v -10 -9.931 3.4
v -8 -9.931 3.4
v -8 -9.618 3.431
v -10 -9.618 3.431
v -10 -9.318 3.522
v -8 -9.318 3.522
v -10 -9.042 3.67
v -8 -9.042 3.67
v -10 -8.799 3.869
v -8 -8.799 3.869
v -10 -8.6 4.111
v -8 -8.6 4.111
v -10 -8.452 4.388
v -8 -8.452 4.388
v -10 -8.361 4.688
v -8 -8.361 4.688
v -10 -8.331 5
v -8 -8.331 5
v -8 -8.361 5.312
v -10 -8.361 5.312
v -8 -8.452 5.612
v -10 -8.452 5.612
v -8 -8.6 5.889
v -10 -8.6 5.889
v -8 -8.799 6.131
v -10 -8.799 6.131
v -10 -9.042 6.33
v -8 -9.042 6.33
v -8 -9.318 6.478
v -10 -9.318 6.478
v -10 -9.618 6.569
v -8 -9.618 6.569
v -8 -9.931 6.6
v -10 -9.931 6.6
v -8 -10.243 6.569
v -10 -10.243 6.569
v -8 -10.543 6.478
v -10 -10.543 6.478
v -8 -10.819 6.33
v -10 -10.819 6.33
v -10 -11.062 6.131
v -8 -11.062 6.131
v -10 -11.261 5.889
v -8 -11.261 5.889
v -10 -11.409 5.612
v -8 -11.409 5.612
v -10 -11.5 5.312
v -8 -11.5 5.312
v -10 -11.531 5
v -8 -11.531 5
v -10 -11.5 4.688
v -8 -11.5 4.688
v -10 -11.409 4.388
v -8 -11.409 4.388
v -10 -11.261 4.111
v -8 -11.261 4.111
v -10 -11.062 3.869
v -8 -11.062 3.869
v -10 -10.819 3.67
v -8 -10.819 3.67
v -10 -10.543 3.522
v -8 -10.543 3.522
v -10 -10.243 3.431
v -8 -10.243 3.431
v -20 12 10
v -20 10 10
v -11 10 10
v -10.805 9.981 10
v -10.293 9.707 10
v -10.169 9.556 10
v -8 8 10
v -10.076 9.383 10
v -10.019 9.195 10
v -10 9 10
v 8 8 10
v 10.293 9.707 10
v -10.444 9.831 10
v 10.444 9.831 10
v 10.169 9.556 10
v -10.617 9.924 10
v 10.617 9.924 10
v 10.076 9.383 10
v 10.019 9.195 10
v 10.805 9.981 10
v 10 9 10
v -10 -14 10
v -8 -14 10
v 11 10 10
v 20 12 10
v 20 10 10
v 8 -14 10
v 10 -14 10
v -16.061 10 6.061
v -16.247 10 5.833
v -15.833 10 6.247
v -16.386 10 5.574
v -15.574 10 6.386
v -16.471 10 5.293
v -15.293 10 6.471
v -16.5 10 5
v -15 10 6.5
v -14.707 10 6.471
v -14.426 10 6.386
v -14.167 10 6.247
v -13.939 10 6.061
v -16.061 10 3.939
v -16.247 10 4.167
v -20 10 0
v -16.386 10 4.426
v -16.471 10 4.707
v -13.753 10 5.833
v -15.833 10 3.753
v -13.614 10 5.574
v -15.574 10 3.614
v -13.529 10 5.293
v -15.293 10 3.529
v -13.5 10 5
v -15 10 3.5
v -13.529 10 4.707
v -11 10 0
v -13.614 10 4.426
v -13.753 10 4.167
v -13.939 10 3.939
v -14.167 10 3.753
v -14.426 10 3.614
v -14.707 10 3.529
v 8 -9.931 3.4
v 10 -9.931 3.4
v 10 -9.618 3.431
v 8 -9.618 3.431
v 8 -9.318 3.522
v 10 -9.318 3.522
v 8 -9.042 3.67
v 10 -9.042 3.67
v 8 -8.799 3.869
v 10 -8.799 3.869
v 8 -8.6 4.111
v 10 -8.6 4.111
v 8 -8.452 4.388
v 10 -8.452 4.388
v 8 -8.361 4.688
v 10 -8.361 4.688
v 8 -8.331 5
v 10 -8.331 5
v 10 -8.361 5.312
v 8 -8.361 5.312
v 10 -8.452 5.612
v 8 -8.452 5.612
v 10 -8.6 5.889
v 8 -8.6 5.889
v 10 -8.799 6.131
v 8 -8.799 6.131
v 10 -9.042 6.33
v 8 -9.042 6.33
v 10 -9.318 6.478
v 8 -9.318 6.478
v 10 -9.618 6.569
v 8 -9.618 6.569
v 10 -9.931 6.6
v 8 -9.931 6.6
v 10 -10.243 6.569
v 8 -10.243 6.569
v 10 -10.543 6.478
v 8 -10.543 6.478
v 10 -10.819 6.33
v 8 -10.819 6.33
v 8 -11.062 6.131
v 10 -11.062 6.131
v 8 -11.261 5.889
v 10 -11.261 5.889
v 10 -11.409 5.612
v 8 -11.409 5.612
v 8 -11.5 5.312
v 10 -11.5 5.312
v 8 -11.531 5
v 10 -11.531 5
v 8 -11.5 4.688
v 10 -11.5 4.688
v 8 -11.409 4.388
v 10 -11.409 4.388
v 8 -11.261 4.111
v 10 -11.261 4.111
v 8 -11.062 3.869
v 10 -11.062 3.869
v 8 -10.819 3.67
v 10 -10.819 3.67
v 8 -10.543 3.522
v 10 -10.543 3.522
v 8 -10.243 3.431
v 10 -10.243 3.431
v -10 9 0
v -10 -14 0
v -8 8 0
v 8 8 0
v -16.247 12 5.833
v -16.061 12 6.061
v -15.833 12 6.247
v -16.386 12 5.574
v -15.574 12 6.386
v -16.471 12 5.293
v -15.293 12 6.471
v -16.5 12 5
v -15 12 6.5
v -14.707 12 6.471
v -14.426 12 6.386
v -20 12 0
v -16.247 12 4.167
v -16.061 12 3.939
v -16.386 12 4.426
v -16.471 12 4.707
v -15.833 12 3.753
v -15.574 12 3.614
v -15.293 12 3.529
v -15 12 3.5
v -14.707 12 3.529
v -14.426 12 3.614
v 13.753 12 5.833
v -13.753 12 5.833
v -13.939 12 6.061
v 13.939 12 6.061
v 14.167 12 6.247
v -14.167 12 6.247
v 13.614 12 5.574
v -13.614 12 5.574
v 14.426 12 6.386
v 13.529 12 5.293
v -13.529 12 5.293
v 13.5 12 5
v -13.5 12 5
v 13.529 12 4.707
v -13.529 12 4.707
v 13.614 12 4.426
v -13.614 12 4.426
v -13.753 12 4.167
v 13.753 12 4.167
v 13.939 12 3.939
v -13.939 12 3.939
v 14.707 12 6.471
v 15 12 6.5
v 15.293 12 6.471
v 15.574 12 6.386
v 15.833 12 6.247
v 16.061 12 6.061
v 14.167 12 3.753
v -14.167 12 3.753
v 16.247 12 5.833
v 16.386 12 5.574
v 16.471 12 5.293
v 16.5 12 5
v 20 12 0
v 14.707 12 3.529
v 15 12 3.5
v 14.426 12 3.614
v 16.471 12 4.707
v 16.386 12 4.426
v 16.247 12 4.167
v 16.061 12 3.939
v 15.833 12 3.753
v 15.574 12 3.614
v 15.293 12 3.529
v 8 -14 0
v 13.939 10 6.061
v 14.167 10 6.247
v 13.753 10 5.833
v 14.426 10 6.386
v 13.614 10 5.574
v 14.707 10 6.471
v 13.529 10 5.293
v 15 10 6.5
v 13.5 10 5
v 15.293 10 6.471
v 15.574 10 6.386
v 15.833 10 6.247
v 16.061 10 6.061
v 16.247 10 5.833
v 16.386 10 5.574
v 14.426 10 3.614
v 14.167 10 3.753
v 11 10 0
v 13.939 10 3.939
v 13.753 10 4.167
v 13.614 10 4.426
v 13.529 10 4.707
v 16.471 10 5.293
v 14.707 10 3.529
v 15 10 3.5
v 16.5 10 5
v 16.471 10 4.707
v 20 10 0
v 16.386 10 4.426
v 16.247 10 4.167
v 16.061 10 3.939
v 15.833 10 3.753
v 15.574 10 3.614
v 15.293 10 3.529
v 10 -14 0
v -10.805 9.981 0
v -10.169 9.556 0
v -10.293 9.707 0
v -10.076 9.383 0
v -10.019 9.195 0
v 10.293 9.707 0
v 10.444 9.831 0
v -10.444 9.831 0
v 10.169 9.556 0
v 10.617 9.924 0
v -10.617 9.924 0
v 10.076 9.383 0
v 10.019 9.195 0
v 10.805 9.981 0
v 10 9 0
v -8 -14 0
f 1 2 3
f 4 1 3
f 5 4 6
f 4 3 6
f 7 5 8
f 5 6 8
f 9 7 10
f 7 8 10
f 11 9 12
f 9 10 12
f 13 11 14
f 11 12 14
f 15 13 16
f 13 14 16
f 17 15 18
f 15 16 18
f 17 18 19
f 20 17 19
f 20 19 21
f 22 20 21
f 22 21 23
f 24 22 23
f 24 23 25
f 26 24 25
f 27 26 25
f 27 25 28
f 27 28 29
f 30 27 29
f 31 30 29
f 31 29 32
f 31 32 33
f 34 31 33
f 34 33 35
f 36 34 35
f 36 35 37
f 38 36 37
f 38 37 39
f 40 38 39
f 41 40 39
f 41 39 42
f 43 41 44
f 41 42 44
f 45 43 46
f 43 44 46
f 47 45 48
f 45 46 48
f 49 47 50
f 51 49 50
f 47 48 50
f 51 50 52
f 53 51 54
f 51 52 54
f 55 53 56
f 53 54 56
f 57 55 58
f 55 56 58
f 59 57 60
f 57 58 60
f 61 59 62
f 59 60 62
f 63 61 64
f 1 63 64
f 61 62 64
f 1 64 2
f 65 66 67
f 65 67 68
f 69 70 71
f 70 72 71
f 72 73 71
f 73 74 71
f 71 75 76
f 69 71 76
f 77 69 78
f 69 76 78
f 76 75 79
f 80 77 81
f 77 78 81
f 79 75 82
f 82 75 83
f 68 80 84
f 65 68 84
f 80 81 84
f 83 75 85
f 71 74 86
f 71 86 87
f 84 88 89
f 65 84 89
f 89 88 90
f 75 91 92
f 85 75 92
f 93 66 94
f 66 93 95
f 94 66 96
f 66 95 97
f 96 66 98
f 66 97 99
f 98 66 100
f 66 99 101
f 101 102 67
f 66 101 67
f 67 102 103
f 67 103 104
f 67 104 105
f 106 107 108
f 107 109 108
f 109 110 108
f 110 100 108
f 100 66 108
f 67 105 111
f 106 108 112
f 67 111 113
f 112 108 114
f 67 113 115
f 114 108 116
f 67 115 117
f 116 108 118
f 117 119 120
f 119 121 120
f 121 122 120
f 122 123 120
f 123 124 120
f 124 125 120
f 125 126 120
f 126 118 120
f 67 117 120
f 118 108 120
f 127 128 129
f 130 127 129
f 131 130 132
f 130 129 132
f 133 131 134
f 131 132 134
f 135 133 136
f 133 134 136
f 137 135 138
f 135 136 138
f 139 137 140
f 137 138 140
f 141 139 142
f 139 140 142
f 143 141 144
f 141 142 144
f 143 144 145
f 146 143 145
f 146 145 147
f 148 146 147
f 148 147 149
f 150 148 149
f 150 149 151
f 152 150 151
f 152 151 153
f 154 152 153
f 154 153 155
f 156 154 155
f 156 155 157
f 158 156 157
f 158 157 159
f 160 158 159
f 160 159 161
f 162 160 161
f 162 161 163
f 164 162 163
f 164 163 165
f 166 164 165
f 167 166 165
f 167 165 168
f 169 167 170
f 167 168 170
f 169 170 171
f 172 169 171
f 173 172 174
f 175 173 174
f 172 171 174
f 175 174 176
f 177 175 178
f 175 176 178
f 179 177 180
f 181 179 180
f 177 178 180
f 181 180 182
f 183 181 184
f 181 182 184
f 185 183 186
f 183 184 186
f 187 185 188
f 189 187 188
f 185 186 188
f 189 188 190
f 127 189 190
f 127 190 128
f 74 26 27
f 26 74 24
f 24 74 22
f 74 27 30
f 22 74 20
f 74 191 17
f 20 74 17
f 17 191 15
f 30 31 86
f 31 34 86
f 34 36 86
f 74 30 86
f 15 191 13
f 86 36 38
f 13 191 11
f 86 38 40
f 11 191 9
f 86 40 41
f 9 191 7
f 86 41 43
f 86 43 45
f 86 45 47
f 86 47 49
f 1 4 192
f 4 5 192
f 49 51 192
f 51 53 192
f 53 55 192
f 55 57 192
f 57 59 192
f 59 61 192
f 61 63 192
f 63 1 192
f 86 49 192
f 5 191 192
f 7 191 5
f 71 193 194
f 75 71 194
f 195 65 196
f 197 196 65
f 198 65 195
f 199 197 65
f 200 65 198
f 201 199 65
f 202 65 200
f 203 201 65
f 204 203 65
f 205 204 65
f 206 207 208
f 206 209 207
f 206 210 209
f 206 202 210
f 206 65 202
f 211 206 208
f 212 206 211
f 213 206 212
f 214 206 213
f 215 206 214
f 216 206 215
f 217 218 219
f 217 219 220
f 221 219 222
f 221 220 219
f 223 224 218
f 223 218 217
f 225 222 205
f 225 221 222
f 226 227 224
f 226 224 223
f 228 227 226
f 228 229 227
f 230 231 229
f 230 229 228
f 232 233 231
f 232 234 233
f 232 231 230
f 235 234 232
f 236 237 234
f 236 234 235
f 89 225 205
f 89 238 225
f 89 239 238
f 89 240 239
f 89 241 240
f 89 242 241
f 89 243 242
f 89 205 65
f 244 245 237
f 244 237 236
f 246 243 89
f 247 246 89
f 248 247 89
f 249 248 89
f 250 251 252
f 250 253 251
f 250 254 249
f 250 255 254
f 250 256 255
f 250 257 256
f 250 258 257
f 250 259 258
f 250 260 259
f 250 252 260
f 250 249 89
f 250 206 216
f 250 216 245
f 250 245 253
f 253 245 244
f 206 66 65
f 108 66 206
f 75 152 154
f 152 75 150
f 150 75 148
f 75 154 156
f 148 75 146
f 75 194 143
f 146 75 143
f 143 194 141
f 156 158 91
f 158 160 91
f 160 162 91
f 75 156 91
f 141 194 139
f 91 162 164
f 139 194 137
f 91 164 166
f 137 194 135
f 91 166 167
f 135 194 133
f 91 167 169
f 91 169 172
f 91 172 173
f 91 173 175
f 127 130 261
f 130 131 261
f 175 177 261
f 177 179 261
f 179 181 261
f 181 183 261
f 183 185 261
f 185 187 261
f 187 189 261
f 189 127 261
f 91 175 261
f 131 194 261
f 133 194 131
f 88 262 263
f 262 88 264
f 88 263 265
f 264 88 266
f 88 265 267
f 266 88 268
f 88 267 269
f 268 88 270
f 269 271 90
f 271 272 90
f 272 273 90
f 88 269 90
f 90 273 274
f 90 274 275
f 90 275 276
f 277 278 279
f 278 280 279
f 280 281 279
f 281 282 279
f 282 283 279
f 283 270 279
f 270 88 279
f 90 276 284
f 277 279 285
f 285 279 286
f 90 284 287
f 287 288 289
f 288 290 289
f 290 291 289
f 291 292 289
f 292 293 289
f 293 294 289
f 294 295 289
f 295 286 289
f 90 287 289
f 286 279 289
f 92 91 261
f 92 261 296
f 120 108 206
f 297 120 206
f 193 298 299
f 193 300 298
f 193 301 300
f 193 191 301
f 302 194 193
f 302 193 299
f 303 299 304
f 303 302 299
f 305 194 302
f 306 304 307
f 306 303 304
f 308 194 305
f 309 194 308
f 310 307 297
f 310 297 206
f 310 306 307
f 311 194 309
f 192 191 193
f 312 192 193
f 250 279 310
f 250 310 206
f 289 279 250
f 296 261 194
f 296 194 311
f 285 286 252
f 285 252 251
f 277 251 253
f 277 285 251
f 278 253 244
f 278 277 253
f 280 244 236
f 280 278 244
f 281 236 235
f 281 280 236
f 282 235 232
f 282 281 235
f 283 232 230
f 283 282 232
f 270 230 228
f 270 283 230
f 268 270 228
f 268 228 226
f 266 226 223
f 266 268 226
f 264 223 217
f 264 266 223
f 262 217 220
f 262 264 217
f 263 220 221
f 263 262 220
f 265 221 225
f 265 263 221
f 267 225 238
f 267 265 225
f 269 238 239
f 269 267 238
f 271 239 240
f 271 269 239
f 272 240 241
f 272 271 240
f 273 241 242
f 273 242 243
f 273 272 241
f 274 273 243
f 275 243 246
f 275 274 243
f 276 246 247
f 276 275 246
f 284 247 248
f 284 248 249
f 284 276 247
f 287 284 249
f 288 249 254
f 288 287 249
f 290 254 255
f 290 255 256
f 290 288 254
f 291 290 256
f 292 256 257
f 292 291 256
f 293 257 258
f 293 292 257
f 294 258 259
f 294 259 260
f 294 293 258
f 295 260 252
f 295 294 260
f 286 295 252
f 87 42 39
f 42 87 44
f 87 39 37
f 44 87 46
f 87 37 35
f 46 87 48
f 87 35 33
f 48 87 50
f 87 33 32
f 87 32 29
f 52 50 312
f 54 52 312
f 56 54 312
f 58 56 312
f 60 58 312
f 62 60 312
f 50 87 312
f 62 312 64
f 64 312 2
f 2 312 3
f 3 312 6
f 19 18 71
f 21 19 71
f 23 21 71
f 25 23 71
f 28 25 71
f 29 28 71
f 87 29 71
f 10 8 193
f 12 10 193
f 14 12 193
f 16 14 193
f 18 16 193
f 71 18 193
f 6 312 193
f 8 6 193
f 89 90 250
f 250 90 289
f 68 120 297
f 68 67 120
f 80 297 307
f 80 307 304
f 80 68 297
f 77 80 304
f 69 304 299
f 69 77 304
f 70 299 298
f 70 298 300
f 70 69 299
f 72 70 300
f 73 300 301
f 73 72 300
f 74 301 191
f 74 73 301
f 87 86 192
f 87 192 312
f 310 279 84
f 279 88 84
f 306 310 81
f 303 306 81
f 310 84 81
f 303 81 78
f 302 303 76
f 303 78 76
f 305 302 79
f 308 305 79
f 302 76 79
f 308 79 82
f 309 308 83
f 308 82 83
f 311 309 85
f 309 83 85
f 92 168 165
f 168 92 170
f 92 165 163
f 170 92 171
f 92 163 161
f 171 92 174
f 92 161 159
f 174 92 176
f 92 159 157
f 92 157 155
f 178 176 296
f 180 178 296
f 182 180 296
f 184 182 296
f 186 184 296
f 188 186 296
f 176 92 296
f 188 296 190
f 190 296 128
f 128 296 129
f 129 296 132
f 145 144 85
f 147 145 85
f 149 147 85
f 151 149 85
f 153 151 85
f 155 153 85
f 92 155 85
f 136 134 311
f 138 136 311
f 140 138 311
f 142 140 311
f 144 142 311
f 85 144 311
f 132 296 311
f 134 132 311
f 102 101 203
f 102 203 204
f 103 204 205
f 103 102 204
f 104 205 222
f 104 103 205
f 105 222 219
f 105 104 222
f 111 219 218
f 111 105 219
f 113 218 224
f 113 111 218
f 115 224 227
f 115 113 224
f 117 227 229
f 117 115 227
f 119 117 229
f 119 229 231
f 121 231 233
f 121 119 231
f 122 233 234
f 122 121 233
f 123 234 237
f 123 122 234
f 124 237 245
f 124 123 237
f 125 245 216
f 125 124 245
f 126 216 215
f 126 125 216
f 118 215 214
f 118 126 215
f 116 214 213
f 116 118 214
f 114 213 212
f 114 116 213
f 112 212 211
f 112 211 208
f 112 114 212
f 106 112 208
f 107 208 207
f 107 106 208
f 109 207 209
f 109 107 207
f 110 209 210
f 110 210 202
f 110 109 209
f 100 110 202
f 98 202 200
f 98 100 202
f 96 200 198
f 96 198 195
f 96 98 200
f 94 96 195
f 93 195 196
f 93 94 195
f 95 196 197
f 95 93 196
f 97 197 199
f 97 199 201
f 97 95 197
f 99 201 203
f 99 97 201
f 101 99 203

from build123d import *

# Parameters (mm, degrees)
BOSS_EXTRUDE1_DEPTH = 10
SKETCH2_W           = 40
SKETCH2_H           = 10
SKETCH2_R           = 1.5
BOSS_EXTRUDE2_DEPTH = 2
FILLET1_R           = 1
SKETCH3_R           = 1.6
CUT_EXTRUDE1_DEPTH  = 35.583232932


with BuildPart() as part:
    # Sketch1 → Boss-Extrude1 (new body)
    with BuildSketch(Plane.XY):
        Polygon((-10, 10), (-10, -10), (-10, -14), (-8, -14), (-8, -8), (-8, 8), (8, 8), (8, -8), (8, -14), (10, -14), (10, -10), (10, 10), align=None)
    extrude(amount=BOSS_EXTRUDE1_DEPTH)

    # Sketch2 → Boss-Extrude2 (add)
    with BuildSketch(Plane(origin=(0, 10, 0), x_dir=(1, 0, 0), z_dir=(0, 1, 0))):
        with Locations((0, -5)):
            Rectangle(SKETCH2_W, SKETCH2_H)
        with Locations(Location((-15, -5, 0), (0, 0, 270))):
            Circle(SKETCH2_R, mode=Mode.SUBTRACT)
        with Locations(Location((15, -5, 0), (0, 0, 90))):
            Circle(SKETCH2_R, mode=Mode.SUBTRACT)
    extrude(amount=BOSS_EXTRUDE2_DEPTH)

    # Fillet1
    fillet1_edges = [part.edges().sort_by_distance(p)[0] for p in [
        (-10, 10, 5),
        (10, 10, 5),
    ]]
    fillet(fillet1_edges, radius=FILLET1_R)

    # Sketch3 → Cut-Extrude1 (cut, through all)
    with BuildSketch(Plane(origin=(10, 0, 0), x_dir=(0, 0, -1), z_dir=(1, 0, 0))):
        with Locations((-5, -9.930512369)):
            Circle(SKETCH3_R)
    extrude(amount=-CUT_EXTRUDE1_DEPTH, mode=Mode.SUBTRACT)


solid = part.part
